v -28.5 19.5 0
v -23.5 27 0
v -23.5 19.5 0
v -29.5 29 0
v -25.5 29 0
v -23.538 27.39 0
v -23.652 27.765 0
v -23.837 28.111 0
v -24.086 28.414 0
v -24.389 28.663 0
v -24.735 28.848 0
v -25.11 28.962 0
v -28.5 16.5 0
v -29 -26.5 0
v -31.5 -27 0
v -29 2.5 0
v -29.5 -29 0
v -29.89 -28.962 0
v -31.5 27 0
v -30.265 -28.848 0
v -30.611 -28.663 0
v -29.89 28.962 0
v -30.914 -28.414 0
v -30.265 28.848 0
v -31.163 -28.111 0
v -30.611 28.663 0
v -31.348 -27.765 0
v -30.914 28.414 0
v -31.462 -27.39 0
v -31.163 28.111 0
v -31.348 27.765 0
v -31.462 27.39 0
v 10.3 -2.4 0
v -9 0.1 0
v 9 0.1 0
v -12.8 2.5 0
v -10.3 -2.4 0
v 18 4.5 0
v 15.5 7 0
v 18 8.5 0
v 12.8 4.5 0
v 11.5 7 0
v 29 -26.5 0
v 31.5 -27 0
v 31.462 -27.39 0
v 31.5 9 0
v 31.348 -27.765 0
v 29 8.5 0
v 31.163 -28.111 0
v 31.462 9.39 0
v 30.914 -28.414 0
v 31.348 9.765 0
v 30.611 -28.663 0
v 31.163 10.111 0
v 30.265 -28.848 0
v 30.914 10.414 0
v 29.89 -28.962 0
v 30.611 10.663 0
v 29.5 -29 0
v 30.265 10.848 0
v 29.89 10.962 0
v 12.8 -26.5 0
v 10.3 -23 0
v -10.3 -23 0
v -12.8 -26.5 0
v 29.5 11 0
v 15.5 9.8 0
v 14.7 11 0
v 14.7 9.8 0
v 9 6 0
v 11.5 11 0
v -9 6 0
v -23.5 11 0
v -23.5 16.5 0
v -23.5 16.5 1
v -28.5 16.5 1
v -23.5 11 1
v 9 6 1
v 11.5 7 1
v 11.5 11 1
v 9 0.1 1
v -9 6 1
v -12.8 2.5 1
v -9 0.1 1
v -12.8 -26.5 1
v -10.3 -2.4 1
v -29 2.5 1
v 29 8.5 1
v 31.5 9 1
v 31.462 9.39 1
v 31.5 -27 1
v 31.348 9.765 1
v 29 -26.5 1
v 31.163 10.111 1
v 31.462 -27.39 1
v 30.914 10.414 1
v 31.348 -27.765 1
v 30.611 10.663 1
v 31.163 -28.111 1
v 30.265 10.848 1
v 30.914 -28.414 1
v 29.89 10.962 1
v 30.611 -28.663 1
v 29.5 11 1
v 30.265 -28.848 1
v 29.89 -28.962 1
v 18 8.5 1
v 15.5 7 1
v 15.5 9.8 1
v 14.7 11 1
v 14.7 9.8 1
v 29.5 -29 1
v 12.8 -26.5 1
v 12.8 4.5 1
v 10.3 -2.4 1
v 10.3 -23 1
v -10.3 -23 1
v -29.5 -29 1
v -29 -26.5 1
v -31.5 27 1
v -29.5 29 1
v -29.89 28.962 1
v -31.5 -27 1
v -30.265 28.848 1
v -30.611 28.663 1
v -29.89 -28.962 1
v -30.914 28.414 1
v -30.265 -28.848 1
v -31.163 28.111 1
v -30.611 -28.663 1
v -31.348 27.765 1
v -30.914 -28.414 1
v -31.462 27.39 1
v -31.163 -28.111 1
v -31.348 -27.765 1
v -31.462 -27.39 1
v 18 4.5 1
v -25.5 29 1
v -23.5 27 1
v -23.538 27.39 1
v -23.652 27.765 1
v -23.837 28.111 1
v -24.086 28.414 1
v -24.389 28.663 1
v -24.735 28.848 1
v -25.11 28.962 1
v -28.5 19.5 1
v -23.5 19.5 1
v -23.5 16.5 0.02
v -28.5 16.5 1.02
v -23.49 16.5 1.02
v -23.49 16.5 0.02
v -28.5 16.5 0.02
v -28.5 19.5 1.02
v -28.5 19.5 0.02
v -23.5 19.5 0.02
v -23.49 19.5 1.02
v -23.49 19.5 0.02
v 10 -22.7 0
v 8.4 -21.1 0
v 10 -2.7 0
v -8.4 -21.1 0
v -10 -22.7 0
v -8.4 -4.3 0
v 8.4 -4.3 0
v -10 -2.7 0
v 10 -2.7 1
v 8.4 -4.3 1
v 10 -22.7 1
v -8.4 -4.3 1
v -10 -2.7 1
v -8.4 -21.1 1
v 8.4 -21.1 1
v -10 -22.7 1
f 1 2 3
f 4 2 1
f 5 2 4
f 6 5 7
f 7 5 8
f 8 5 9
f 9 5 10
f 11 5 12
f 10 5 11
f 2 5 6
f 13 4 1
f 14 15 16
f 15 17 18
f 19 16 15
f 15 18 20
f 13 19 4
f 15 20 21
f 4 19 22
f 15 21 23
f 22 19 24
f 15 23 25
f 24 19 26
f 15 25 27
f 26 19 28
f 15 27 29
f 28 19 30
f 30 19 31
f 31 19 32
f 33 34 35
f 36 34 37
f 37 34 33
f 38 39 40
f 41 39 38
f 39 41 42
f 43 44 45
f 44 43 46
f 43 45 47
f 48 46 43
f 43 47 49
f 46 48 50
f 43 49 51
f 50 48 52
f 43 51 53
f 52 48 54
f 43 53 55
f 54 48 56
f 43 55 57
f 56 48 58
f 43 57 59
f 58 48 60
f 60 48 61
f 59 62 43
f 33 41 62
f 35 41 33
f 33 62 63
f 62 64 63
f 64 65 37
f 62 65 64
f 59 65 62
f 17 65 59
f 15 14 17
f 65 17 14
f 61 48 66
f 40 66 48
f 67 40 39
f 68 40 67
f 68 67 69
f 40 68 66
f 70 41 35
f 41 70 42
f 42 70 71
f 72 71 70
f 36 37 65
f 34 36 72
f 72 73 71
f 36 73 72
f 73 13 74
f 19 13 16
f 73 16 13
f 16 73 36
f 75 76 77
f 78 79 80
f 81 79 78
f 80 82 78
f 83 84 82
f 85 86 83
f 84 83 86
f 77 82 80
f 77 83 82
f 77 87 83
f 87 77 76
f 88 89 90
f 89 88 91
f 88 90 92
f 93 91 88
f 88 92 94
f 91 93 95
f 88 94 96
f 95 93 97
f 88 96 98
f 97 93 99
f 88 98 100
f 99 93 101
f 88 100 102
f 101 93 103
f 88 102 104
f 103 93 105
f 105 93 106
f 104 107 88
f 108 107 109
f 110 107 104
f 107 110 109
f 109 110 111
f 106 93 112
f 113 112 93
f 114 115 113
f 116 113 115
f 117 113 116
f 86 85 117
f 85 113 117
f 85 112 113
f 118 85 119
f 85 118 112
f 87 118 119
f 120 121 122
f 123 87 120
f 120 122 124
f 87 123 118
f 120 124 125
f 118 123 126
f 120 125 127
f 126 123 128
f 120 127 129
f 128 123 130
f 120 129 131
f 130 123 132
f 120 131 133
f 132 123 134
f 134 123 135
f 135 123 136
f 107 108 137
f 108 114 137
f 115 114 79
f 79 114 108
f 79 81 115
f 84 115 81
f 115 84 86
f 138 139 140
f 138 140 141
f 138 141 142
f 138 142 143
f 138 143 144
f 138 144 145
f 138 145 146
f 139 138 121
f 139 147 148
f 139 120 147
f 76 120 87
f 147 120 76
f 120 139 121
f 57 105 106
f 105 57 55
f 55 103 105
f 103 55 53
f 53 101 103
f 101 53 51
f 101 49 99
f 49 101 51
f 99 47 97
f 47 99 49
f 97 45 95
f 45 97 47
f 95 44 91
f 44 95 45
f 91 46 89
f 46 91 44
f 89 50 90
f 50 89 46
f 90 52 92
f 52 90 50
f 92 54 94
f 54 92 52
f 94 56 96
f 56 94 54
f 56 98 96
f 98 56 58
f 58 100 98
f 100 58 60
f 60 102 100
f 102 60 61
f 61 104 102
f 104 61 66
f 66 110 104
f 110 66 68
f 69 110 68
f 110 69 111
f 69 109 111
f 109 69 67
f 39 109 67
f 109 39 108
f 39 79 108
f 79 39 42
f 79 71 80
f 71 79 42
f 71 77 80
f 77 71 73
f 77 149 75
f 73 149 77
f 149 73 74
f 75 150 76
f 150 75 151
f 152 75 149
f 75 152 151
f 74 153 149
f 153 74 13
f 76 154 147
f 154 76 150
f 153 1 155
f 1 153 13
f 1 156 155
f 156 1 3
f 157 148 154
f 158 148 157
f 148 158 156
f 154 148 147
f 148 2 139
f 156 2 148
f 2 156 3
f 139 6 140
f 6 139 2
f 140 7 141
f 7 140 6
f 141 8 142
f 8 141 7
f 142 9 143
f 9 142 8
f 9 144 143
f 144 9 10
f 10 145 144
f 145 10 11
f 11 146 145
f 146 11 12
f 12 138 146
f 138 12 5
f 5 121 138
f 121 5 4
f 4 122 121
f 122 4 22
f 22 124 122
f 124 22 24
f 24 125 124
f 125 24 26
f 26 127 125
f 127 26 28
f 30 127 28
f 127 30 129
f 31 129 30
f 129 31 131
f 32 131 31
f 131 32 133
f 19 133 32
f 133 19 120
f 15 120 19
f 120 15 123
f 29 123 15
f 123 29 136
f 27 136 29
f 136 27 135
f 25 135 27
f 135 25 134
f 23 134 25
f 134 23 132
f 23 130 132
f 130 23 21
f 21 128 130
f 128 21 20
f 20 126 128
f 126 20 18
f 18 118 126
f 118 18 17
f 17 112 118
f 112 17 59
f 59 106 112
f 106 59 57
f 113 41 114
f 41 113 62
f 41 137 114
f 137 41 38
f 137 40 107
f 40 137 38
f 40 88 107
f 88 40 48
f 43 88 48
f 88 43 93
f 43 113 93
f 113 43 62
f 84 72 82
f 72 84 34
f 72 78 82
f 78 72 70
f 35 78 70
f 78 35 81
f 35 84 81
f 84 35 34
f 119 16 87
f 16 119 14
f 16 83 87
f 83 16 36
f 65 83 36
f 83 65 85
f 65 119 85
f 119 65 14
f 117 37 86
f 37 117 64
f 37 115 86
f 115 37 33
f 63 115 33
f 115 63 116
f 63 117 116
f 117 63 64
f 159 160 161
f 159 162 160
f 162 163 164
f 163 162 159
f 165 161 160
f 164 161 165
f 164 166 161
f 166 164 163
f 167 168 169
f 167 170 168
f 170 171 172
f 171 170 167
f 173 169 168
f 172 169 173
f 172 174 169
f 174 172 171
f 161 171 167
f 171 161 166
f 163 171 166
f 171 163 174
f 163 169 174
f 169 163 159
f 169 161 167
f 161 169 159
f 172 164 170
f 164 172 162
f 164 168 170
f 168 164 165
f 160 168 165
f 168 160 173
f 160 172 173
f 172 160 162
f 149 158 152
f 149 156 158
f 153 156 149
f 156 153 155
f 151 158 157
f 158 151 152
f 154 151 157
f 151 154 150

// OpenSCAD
// file: ../lib/emboss.scad
// cad/lib/emboss.scad
include <../generated/dims.scad>

module engrave(code, at, z, size = LABEL_SIZE, facing = -1, spin = 0) {
    if (facing < 0)
        translate([at[0] + LABEL_DEPTH, at[1], z]) rotate([90, 0, -90])
            linear_extrude(LABEL_DEPTH + 0.01) rotate(spin) text(code, size = size, halign = "center", valign = "center");
    else
        translate([at[0] - LABEL_DEPTH, at[1], z]) rotate([90, 0, 90])
            linear_extrude(LABEL_DEPTH + 0.01) rotate(-spin) text(code, size = size, halign = "center", valign = "center");
}
// file: ../parts/setting_block.scad
// cad/parts/setting_block.scad
include <../generated/dims.scad>
use <../profile.scad>
use <../lib/emboss.scad>

function setting_top(pane_t) = GLASS_Y0 + (is_undef(pane_t) ? GLASS_T : pane_t);

module setting_block(code, wedge = false, pane_t) {
    s = tan(SILL_SLOPE_DEG);
    floor_x = function(y) FRAME_BODY - (bead_seat_y() - y) * s;
    y0 = GLASS_Y0;
    y1 = setting_top(pane_t);
    pts = wedge ? [[floor_x(y0), y0], [floor_x(y1), y1], [GLASS_EDGE, y1], [GLASS_EDGE, y0]]
                : [[0, y0], [0, y1], [GLASS_CLEAR, y1], [GLASS_CLEAR, y0]];
    difference() {
        linear_extrude(SETTING_L) polygon(pts);
        engrave(code, [wedge ? floor_x(y0) + 0.2 : 0, (y0 + y1) / 2], SETTING_L / 2, 3);
    }
}
// file: ../parts/weep_cap.scad
// cad/parts/weep_cap.scad
include <../generated/dims.scad>
use <../lib/emboss.scad>

module weep_cap(code) {
    w = WEEP_W + 10;
    t = WEEP_CAP_T;
    sx = (WEEP_CAP_H - WEEP_H) / 2;
    difference() {
        cube([WEEP_CAP_H, 4, w]);
        translate([-1, -0.01, t]) cube([WEEP_CAP_H - t + 1, 4 - t + 0.01, w - 2 * t]);
    }
    for (z = [5 + 0.2, w - 5 - 0.2 - 1.2])
        translate([sx + 0.2, -3, z]) cube([WEEP_H - 0.4, 3 + 4 - t + 0.01, 1.2]);
}
// file: ../parts/sill_nose.scad
// cad/parts/sill_nose.scad
include <../generated/dims.scad>
use <../profile.scad>
use <../lib/emboss.scad>

module nose_profile() {
    s = tan(SILL_SLOPE_DEG);
    p = NOSE_PROJECTION;
    top = NOSE_KEY_X + NOSE_KEY_W + 6;
    xt = function(y) top + y * s;
    difference() {
        union() {
            polygon([[top, 0], [NOSE_KEY_X - 2, 0], [NOSE_KEY_X - 2, -3], [xt(-3) - 3, -3],
                     [xt(-p + 3) - 3, -p + 3], [-4, -p + 3], [-4, -p], [xt(-p), -p]]);
            translate([NOSE_KEY_X, 0]) key_tongue(NOSE_KEY_D, NOSE_KEY_W);
        }
        rect(-2, -p + 2.4, 0, -p + 3 + 0.01);
    }
}

module sill_nose(len, code) {
    difference() {
        linear_extrude(len) nose_profile();
        engrave(code, [NOSE_KEY_X - 2, -1.5], len / 2, 2);
    }
}
// file: ../parts/screen_hinge.scad
// cad/parts/screen_hinge.scad
include <../generated/dims.scad>

KN_D = 10;
PIN_D = 4.3;
LEAF_T = 3;
AXIS_W = SCREEN_DEPTH + 5;
FRAME_KN = [[-20, -12], [-4, 4], [12, 20]];
SCREEN_KN = [[-11.6, -4.4], [4.4, 11.6]];
WALL_T = 3;
PLATE_W = 17;

function hinge_hole_v() = HINGE_BOSS_X - (FRAME_BODY - SCREEN_OVERLAP);
function hinge_wall_v() = -WALL_T;
function hinge_plate_v() = -WALL_T - PLATE_W;
function hinge_leaf_t() = LEAF_T;

WALL_R = 1;

module soften_plan(r) { offset(r = r, $fn = 32) offset(delta = -r) children(); }

module knuckles(spans) {
    for (s = spans) translate([s[0], 0, AXIS_W]) rotate([0, 90, 0]) cylinder(d = KN_D, h = s[1] - s[0], $fn = 32);
}

module pin_hole() {
    translate([-21, 0, AXIS_W]) rotate([0, 90, 0]) cylinder(d = PIN_D, h = 42, $fn = 20);
}

module screen_hinge(code) {
    v_hole = hinge_hole_v();
    assert(EDGE_R <= PLATE_W / 2 && WALL_R <= WALL_T / 2, "hinge leaf rounding fits the plate and wall");
    difference() {
        union() {
            linear_extrude(LEAF_T) union() {
                soften_plan(EDGE_R) translate([-20, hinge_plate_v()]) square([40, PLATE_W]);
                translate([-20, hinge_plate_v() + EDGE_R]) square([40, PLATE_W - EDGE_R]);
                translate([-20, hinge_wall_v()]) square([40, WALL_T - WALL_R]);
            }
            linear_extrude(AXIS_W) soften_plan(WALL_R) translate([-20, hinge_wall_v()]) square([40, WALL_T]);
            knuckles(FRAME_KN);
        }
        pin_hole();
        for (u = [-BOSS_PITCH / 2, BOSS_PITCH / 2])
            translate([u, v_hole, -0.01]) cylinder(d = 4.4, h = LEAF_T + 0.02, $fn = 20);
    }
}

module screen_leaf(code) {
    assert(EDGE_R <= 5 / 2, "screen leaf rounding fits its wall");
    difference() {
        union() {
            translate([0, 0, SCREEN_DEPTH]) linear_extrude(LEAF_T) soften_plan(EDGE_R) translate([-12, 0]) square([24, 28]);
            translate([0, 0, SCREEN_DEPTH]) linear_extrude(AXIS_W - SCREEN_DEPTH) soften_plan(EDGE_R) translate([-12, 0]) square([24, 5]);
            knuckles(SCREEN_KN);
        }
        pin_hole();
        for (u = [-8, 8]) translate([u, 18, SCREEN_DEPTH - 0.01]) cylinder(d = 3.4, h = LEAF_T + 0.02, $fn = 16);
    }
}
// file: ../parts/cam_lock.scad
// cad/parts/cam_lock.scad
include <../generated/dims.scad>

R0 = 18;
R1 = 40;
LEAD = 2;
RISE = 3;
ARC = 40;
BASE_T = 4;
BOSS_D = 14;
BOSS_H = 5;
LIP_T = 3;
HUB_D = 26;
LIP_HALF = 10;
KEEPER_HALF = 20;

function sash_face_w() = LIP_Y1 - DEPTH;
function keeper_v() = TRANSOM_W / 2 + TRANSOM_HALF_BODY + SASH_GAP + SASH_BODY / 2 - CAM_BOSS_X;
function lip_w() = BASE_T + LEAD + RISE;
function flag_half_run() = R1 * sin(ARC / 2);
function keeper_lip_half_run() = LIP_HALF;
function keeper_half_run() = KEEPER_HALF;

TOP_R = 1.5;

module soften_plan(r) { offset(r = r, $fn = 32) offset(delta = -r) children(); }

module soft_top(h, r = TOP_R, n = 6) {
    linear_extrude(h - r) children();
    for (i = [0 : n - 1]) translate([0, 0, h - r + i * r / n - 0.01]) linear_extrude(r / n + 0.01)
        offset(delta = -(r - sqrt(r * r - pow((i + 1) * r / n, 2)))) children();
}

module countersunk(d, t) {
    translate([0, 0, -0.01]) cylinder(d = d, h = t + 0.02, $fn = 20);
    translate([0, 0, t - 2.2]) cylinder(d1 = d, d2 = CSK_D, h = 2.21, $fn = 24);
}

module cam_base(code) {
    assert(EDGE_R <= 22 / 2, "cam base plate rounding fits the plate");
    difference() {
        union() {
            linear_extrude(BASE_T) soften_plan(EDGE_R) translate([-20, -10]) square([40, 22]);
            cylinder(d = BOSS_D, h = BASE_T + BOSS_H, $fn = 48);
        }
        for (u = [-BOSS_PITCH / 2, BOSS_PITCH / 2]) translate([u, 0, 0]) countersunk(4.4, BASE_T);
        translate([0, 0, BASE_T + BOSS_H - INSERT_M4_L + 0.01]) cylinder(d = INSERT_M4_D, h = INSERT_M4_L, $fn = 24);
    }
}

module flag_slice(k) {
    rotate([0, 0, 90 - ARC / 2 + k * ARC / 8])
        translate([R0, -0.5, BASE_T]) cube([R1 - R0, 1, LEAD + RISE * (1 - k / 8)]);
}

module flag_web(k) {
    rotate([0, 0, 90 - ARC / 2 + k * ARC / 8])
        translate([HUB_D / 2 - 1, -0.5, BASE_T]) cube([R0 - HUB_D / 2 + 2, 1, LEAD]);
}

module cam_handle(code) {
    assert(HANDLE_R <= 12 / 2 && TOP_R <= BOSS_H - 0.3, "cam handle rounding fits the lever and hub");
    difference() {
        union() {
            translate([0, 0, BASE_T]) soft_top(BOSS_H - 0.3) circle(d = HUB_D, $fn = 48);
            for (k = [0 : 7]) hull() { flag_slice(k); flag_slice(k + 1); }
            for (k = [0 : 7]) hull() { flag_web(k); flag_web(k + 1); }
            translate([0, 0, BASE_T]) soft_top(10) soften_plan(HANDLE_R) union() {
                translate([-64, -6]) square([58, 12]);
                translate([-64, 0]) circle(d = 16, $fn = 32);
            }
        }
        translate([0, 0, BASE_T - 0.01]) cylinder(d = BOSS_D + 0.4, h = BOSS_H + 0.02, $fn = 48);
    }
}

module cam_keeper(code) {
    kv = keeper_v();
    sw = sash_face_w();
    assert(EDGE_R <= 10 / 2, "keeper rounding fits the post");
    difference() {
        union() {
            translate([0, 0, sw]) linear_extrude(3) soften_plan(EDGE_R) translate([-KEEPER_HALF, kv - 6]) square([2 * KEEPER_HALF, 22]);
            translate([0, 0, sw]) linear_extrude(lip_w() + LIP_T - sw) soften_plan(EDGE_R) translate([-8, kv + 5]) square([16, 10]);
            translate([-LIP_HALF, R0 - 2, lip_w()]) cube([2 * LIP_HALF, kv + 15 - (R0 - 2), LIP_T]);
        }
        for (u = [-BOSS_PITCH / 2, BOSS_PITCH / 2]) translate([u, kv, sw]) countersunk(4.4, 3);
    }
}
// file: ../parts/transom_shoe.scad
// cad/parts/transom_shoe.scad
include <../generated/dims.scad>
use <../profile.scad>
use <../lib/segment.scad>
use <../lib/emboss.scad>
use <jamb_node.scad>

EPS = 0.01;

function shoe_fin_stub() = [TRANSOM_W / 2 + TRANSOM_HALF_BODY + FIN_L - EPS, FIN_Y0, TRANSOM_W, FIN_Y1, 0, FIN_L];

function shoe_turn(j, r, up, seam = false) =
    [[up ? r[0] : -EPS, r[1], up ? TRANSOM_W + EPS : r[2], r[3], seam ? -EPS : j[0] - FRAME_BODY, j[2] - FRAME_BODY], j, r, seam];

function shoe_turns() = [
    shoe_turn(seal_kerf_rects("sash_rebate")[0], seal_kerf_rects("transom")[0], true),
    shoe_turn(seal_kerf_rects("sash_rebate")[1], seal_kerf_rects("transom")[1], true),
    shoe_turn(mag_rect("sash_rebate"), mag_rect("transom"), true, true),
    shoe_turn(glazing_kerf_rect("glazing"), glazing_kerf_rect("transom"), false),
];

function shoe_seam_groove() =
    [glazing_kerf_rect("transom")[2] + MIN_SKIN, STOP_T / 2 - CORD_D / 2,
     TRANSOM_W / 2 + TRANSOM_HALF_BODY - MIN_SKIN, STOP_T / 2 + CORD_D / 2, -EPS, CORD_D / 2];

module box(b) { translate([b[0], b[1], b[4]]) cube([b[2] - b[0], b[3] - b[1], b[5] - b[4]]); }

module transom_shoe(code, mirrored = false, core) {
    L = FRAME_W - FRAME_BODY;
    c = TRANSOM_W / 2;
    at = label_at("transom");
    difference() {
        translate([mirrored ? TRANSOM_W : 0, 0, 0]) mirror([mirrored ? 1 : 0, 0, 0]) difference() {
            union() {
                linear_extrude(L) profile("transom", core = core);
                linear_extrude(SHOE_WALL) profile_solid("transom", false, core);
                fin_stub(shoe_fin_stub());
                multmatrix([[0, 1, 0, c], [0, 0, 1, STOP_T + DOVE_CLEAR], [1, 0, 0, 0]])
                    linear_extrude(DEPTH - STOP_T - DOVE_CLEAR) dove_tongue2d();
            }
            for (t = shoe_turns()) box(t[0]);
            translate([0, 0, L - CORD_D / 2]) end_groove("transom", core);
            bevel_ends(L, bottom = false) bevel_outline("transom", core);
            for (q = lock_uv()) translate([c + q[1], 0, q[0]]) lock_hole();
            box(shoe_seam_groove());
            tube_screw("transom", SHOE_WALL + (L - SHOE_WALL) / 2, DEPTH - MAG_D, core);
        }
        engrave(code, [mirrored ? TRANSOM_W - at[0] : at[0], at[1]], L / 2, facing = mirrored ? 1 : -1);
    }
}
// file: ../parts/jamb_node.scad
// cad/parts/jamb_node.scad
include <../generated/dims.scad>
use <../profile.scad>
use <../lib/segment.scad>
use <../lib/emboss.scad>

EPS = 0.01;

function lock_uv(d = DOVE_D, f = DOVE_FLARE, u = LOCK_U) = [for (s = [-1, 1]) [-u, s * (DOVE_W / 2 + f * u / d)]];

function lock_top() = DEPTH - MAG_D;

module lock_hole() {
    s = DEPTH - lock_top();
    translate([0, DEPTH + EPS, 0]) rotate([90, 0, 0]) {
        cylinder(d = LOCK_D, h = LOCK_L + EPS, $fn = 16);
        translate([0, 0, s]) cylinder(d1 = CSK_D, d2 = LOCK_D, h = (CSK_D - LOCK_D) / 2, $fn = 32);
        translate([0, 0, -1]) cylinder(d = CSK_D, h = s + 1 + EPS, $fn = 32);
    }
}

function node_key_len() = TRANSOM_W / 2 - TRANSOM_HALF_BODY;

function dove_slot(d = DOVE_D, f = DOVE_FLARE) =
    let(m = DOVE_W / 2, b = m + f)
    [[EPS, -m], [EPS, m], [0, m], [-d, b], [-d, -b], [0, -m]];

function dove_head(c, d = DOVE_D, f = DOVE_FLARE) =
    let(m = DOVE_W / 2, b = m + f, l = norm([d, f]), mh = m - c * (l - f) / d, bh = b - c * (l + f) / d)
    [[-c, -mh], [-c, mh], [-d + c, bh], [-d + c, -bh]];

function dove_root_w() = DOVE_W - 2 * DOVE_CLEAR;

function dove_root_d() = SHOE_WALL;

module dove_slot2d(d = DOVE_D, f = DOVE_FLARE) { polygon(dove_slot(d, f)); }

module dove_tongue2d(d = DOVE_D, f = DOVE_FLARE) {
    polygon(dove_head(DOVE_CLEAR, d, f));
    translate([-DOVE_CLEAR - EPS, -dove_root_w() / 2]) square([dove_root_d() + DOVE_CLEAR + EPS, dove_root_w()]);
}

module jamb_node(code, core) {
    c = TRANSOM_W / 2;
    k = node_key_len();
    b = [0, 0, FRAME_BODY, DEPTH];
    s = node_sharp(b, ["glazing", "sash_rebate"]);
    difference() {
        linear_extrude(TRANSOM_W) soft_rect(b, s);
        bevel_ends(TRANSOM_W) difference() { soft_rect(b, s); bead_key("glazing"); }
        translate([0, 0, -EPS]) linear_extrude(TRANSOM_W + 2 * EPS) pocket_cut("glazing", core);
        for (z = [-EPS, TRANSOM_W - k]) translate([0, 0, z]) linear_extrude(k + EPS) bead_key("glazing");
        for (z = [-EPS, TRANSOM_W - CORD_D / 2]) translate([0, 0, z]) intersection() { end_groove("glazing", core); linear_extrude(CORD_D) offset(delta = -CORD_INSET) soft_rect(b, s); }
        translate([FRAME_BODY, DEPTH + EPS, c]) rotate([90, 0, 0]) linear_extrude(DEPTH - STOP_T + EPS) dove_slot2d();
        for (q = lock_uv()) translate([FRAME_BODY + q[0], 0, c + q[1]]) lock_hole();
        tube_screw("glazing", c, core = core);
        for (dz = [-NODE_FIX_OFFSET, NODE_FIX_OFFSET]) fixing_hole("glazing", c + dz);
        engrave(code, label_at("glazing"), c);
    }
}
// file: ../parts/corner_block.scad
// cad/parts/corner_block.scad
include <../generated/dims.scad>
use <../profile.scad>
use <../lib/segment.scad>
use <../lib/emboss.scad>

EPS = 0.01;
ALONG_X = [[0, 0, 1, 0], [0, 1, 0, 0], [1, 0, 0, 0]];

function socket_limit(a, b, core) = profile_width(b) - pocket_rect(b, core)[2] - CHAMBER_WALL;
function corner_anchor(a, b) = profile_width(b) - socket_depth(a) / 2;
function corner_screw_at(a, b) = corner_anchor(a, b) - fix_dz(a) / 2;
function corner_fix_at(a, b) = corner_anchor(a, b) + fix_dz(a) / 2;

module half_space(lo, hi, below) {
    pts = below ? [[lo, lo], [hi, lo], [hi, hi]] : [[lo, lo], [hi, hi], [lo, hi]];
    translate([0, DEPTH + 1, 0]) rotate([90, 0, 0]) linear_extrude(DEPTH + 2) polygon(pts);
}

module leg(a, b, core) {
    z0 = profile_min(b);
    z1 = profile_width(b);
    translate([0, 0, z0]) linear_extrude(z1 - z0) profile(a, false, core);
    translate([0, 0, z1 - END_CAP]) end_cap(a, false, core);
    intersection() {
        translate([0, 0, z0]) linear_extrude(z1 - z0) profile_solid(a, false, core);
        union() {
            screw_column(a, corner_screw_at(a, b), core);
            if (is_perimeter(a)) fixing_column(a, corner_fix_at(a, b));
        }
    }
}

module leg_cuts(a, b, core) {
    z1 = profile_width(b);
    translate([0, 0, z1 - socket_depth(a)]) linear_extrude(socket_depth(a) + EPS) pocket_cut(a, core);
    translate([0, 0, z1 - CORD_D / 2]) end_groove(a, core);
    bevel_ends(z1, bottom = false) bevel_outline(a, core);
    tube_screw(a, corner_screw_at(a, b), core = core);
    if (is_perimeter(a)) fixing_hole(a, corner_fix_at(a, b));
}

module corner_block(a, b, code, mirrored = false, core_a, core_b) {
    assert(socket_depth(a) <= socket_limit(a, b, core_b) && socket_depth(b) <= socket_limit(b, a, core_a), str(code, ": tube sockets collide"));
    lo = min(profile_min(a), profile_min(b));
    hi = max(profile_width(a), profile_width(b));
    difference() {
        mirror([mirrored ? 1 : 0, 0, 0]) difference() {
            union() {
                intersection() {
                    multmatrix(ALONG_X) leg(a, b, core_a);
                    half_space(lo - 1, hi + 1, true);
                }
                intersection() {
                    leg(b, a, core_b);
                    half_space(lo - 1, hi + 1, false);
                }
            }
            multmatrix(ALONG_X) leg_cuts(a, b, core_a);
            leg_cuts(b, a, core_b);
        }
        engrave(code, label_at(b), (profile_min(a) + profile_width(a)) / 2, facing = mirrored ? 1 : -1);
    }
}
// file: ../lib/segment.scad
// cad/lib/segment.scad
include <../generated/dims.scad>
use <../profile.scad>
use <emboss.scad>

EPS = 0.01;

function is_perimeter(name) = name == "glazing" || name == "sash_rebate" || name == "sill";

function top_face(name) = name == "sash" ? LIP_Y1 : name == "screen" ? SCREEN_DEPTH : DEPTH;

function boss_x(name) =
    name == "sash_rebate" ? HINGE_BOSS_X : name == "transom" ? CAM_BOSS_X : name == "sash" ? SASH_BODY / 2 : undef;

function boss_offsets(dz) = dz == 0 ? [0] : [-dz, dz];

function boss_dz_min(name, core) =
    BOSS_PITCH / 2 + max((INSERT_M4_D + MIN_SKIN) / 2,
        fix_dz(name) / 2 + sqrt(max(0, pow(csk_d(name, core) / 2 + INSERT_M4_D / 2 + MIN_SKIN, 2) - pow(boss_x(name) - screw_x(name, core), 2))));

function boss_dz_max(len) = len / 2 - END_CAP - MIN_SKIN - INSERT_M4_D / 2 - BOSS_PITCH / 2;

function screw_x(name, core) =
    name == "transom" ? (core == "vslot" ? VSLOT_TRANSOM_X : TRANSOM_SCREW_X) : pocket_origin(name, core)[0] + pocket(name)[0] / 2;

function tnut(name, core) = core == "vslot" && name != "transom";

function csk_d(name, core) = tnut(name, core) ? VSLOT_CSK_D : CSK_D;

function column_d(name, core) = tnut(name, core) ? VSLOT_CSK_D + 4 : 10;

function vslot_shell(name) = top_face(name) - pocket_rect(name, "vslot")[3];

function vslot_tip_target() = (VSLOT_TIP[0] + VSLOT_TIP[1]) / 2;

function vslot_screw_l(name) = max([for (l = VSLOT_M5_L) if (l <= vslot_shell(name) + vslot_tip_target() + 1e-9) l]);

function vslot_seat(name) = vslot_shell(name) + vslot_tip_target() - vslot_screw_l(name);

function label_at(name) =
    name == "transom" ? [TRANSOM_W / 2 - TRANSOM_HALF_BODY, GLASS_Y0 + 11]
  : name == "mullion_glazing" ? [MULLION_W / 2 - MULLION_HALF_BODY, GLASS_Y0 + 11]
  : name == "mullion_sash" ? [MULLION_W / 2 - MULLION_HALF_BODY, (FIN_Y1 + LIP_Y0) / 2]
  : name == "sash" ? [0, (FLANGE_Y1 + LIP_Y0) / 2]
  : name == "screen" ? [0, SCREEN_DEPTH / 2]
  : [0, DEPTH / 2];

function weep_rect(name) =
    name == "sill" ? let(f = FRAME_BODY - (bead_seat_y() - STOP_T) * tan(SILL_SLOPE_DEG)) [f - 1, -1, f - 1 + WEEP_H, STOP_T + 1]
  : name == "transom" ? let(th = TRANSOM_W / 2 + TRANSOM_HALF_BODY) [th - 0.5, FIN_Y0 - 1, th + WEEP_H, FIN_Y1 + 1]
  : name == "sash" ? [SASH_BODY - 1, SASH_Y0 - 1, SASH_BODY - 1 + WEEP_H, STOP_T + 1]
  : undef;

module end_groove(name, core) { linear_extrude(CORD_D / 2 + EPS) cord_ring(name, core); }

module end_cap(name, pocket = true, core) { linear_extrude(END_CAP) profile_solid(name, pocket, core); }

module tube_screw(name, z, top = undef, core) {
    t = tnut(name, core);
    assert(!t || is_undef(top), str(name, ": a T-nut screw takes no seat override"));
    p = pocket_rect(name, core);
    d = t ? VSLOT_SCREW_D : TUBE_SCREW_D;
    k = csk_d(name, core);
    cone = t ? (k - d) / 2 : 2.2;
    h = (t ? top_face(name) - vslot_seat(name) : is_undef(top) ? top_face(name) : top) - p[3];
    translate([screw_x(name, core), p[3] - EPS, z]) rotate([-90, 0, 0]) {
        cylinder(d = d, h = top_face(name) - p[3] + 1, $fn = 24);
        translate([0, 0, h - cone]) cylinder(d1 = d, d2 = k, h = cone + 2 * EPS, $fn = 32);
        translate([0, 0, h]) cylinder(d = k, h = top_face(name) - p[3] - h + 1, $fn = 32);
    }
}

module screw_column(name, z, core) {
    p = pocket_rect(name, core);
    translate([screw_x(name, core), p[3], z]) rotate([-90, 0, 0]) cylinder(d = column_d(name, core), h = top_face(name) - p[3], $fn = 32);
}

module fixing_hole(name, z) {
    translate([-1, fix_y(name), z]) rotate([0, 90, 0]) cylinder(d = FIX_D, h = FRAME_W + 2, $fn = 24);
    translate([rebate_face(name) - FIX_CB_L, fix_y(name), z]) rotate([0, 90, 0])
        cylinder(d = FIX_CB_D, h = FIX_CB_L + 1, $fn = 32);
}

module fixing_column(name, z) {
    translate([-1, fix_y(name), z]) rotate([0, 90, 0]) cylinder(d = FIX_BOSS_D, h = FRAME_BODY + 1, $fn = 40);
}

module boss_columns(name, z, core) {
    p = pocket_rect(name, core);
    for (dz = [-BOSS_PITCH / 2, BOSS_PITCH / 2])
        translate([boss_x(name), p[3], z + dz]) rotate([-90, 0, 0])
            cylinder(d = INSERT_M4_D + 4, h = top_face(name) - p[3], $fn = 32);
}

module insert_holes(name, z) {
    for (dz = [-BOSS_PITCH / 2, BOSS_PITCH / 2])
        translate([boss_x(name), top_face(name) + EPS, z + dz]) rotate([90, 0, 0])
            cylinder(d = INSERT_M4_D, h = INSERT_M4_L, $fn = 24);
}

module local_solids(name, z, bosses = false, boss_dz = 0, core) {
    screw_column(name, z - fix_dz(name) / 2, core);
    if (is_perimeter(name)) fixing_column(name, z + fix_dz(name) / 2);
    if (bosses) for (c = boss_offsets(boss_dz)) boss_columns(name, z + c, core);
}

module local_cuts(name, z, bosses = false, boss_dz = 0, core) {
    tube_screw(name, z - fix_dz(name) / 2, core = core);
    if (is_perimeter(name)) fixing_hole(name, z + fix_dz(name) / 2);
    if (bosses) for (c = boss_offsets(boss_dz)) insert_holes(name, z + c);
}

module segment(name, len, code, weep = false, bosses = false, boss_dz = 0, core) {
    assert(len > 0 && len <= MAX_SEG, str(code, ": length ", len, " outside 0..", MAX_SEG));
    assert(!weep || name == "sill" || name == "transom" || name == "sash", str(code, ": no weep on ", name));
    assert(!bosses || boss_x(name) != undef, str(code, ": no bosses on ", name));
    if (boss_dz != 0)
        assert(bosses && abs(boss_dz) >= boss_dz_min(name, core) && abs(boss_dz) <= boss_dz_max(len),
               str(code, ": boss offset ", boss_dz, " outside ", boss_dz_min(name, core), "..", boss_dz_max(len)));
    difference() {
        union() {
            linear_extrude(len) profile(name, core = core);
            for (z = [0, len - END_CAP]) translate([0, 0, z]) end_cap(name, core = core);
            intersection() {
                linear_extrude(len) profile_solid(name, core = core);
                local_solids(name, len / 2, bosses, abs(boss_dz), core);
            }
        }
        for (z = [-EPS, len - CORD_D / 2]) translate([0, 0, z]) end_groove(name, core);
        bevel_ends(len) bevel_outline(name, core);
        local_cuts(name, len / 2, bosses, abs(boss_dz), core);
        if (weep) translate([0, 0, len / 2 - WEEP_W / 2]) linear_extrude(WEEP_W) rect_r(weep_rect(name));
        engrave(code, label_at(name), len / 2);
    }
}
// file: ../generated/layout.scad
NAME = "bench-600";
W = 584.0;
H = 584.0;
TRANSOM_C = 291.0;
AWNING_H = 200.0;
SASH = [478.0, 210.0];
SCREEN = [524.0, 290.0];
FIXED_GLASS = [498, 228];
SASH_GLASS_DIMS = [406, 138];
GLAZING = "acrylic";
SEG_HEAD = 232.5;
N_HEAD = 2;
SEG_SILL = 232.5;
N_SILL = 2;
SEG_JAMB_LOWER = 196.0;
N_JAMB_LOWER = 1;
SEG_JAMB_UPPER = 198.0;
N_JAMB_UPPER = 1;
SEG_TRANSOM = 232.5;
N_TRANSOM = 2;
SEG_SASH_HORIZONTAL = 186.5;
N_SASH_HORIZONTAL = 2;
SEG_SASH_VERTICAL = 106.0;
N_SASH_VERTICAL = 1;
SEG_SCREEN_HORIZONTAL = 232.0;
N_SCREEN_HORIZONTAL = 2;
SEG_SCREEN_VERTICAL = 230.0;
N_SCREEN_VERTICAL = 1;
// file: ../generated/dims.scad
MAX_SEG = 240.0;
JOINT_GAP = 1.0;
DEPTH = 63.0;
FRAME_W = 58.0;
FRAME_BODY = 40.0;
TRANSOM_W = 70.0;
TRANSOM_HALF_BODY = 17.0;
SASH_W = 51.0;
SASH_BODY = 33.0;
SASH_Y0 = 2.0;
SASH_GAP = 13.0;
STAY_W = 14.0;
SCREEN_W = 30.0;
SCREEN_DEPTH = 20.0;
SCREEN_OVERLAP = 10.0;
SCREEN_SHELL = 4.0;
GLASS_T = 24.0;
TWINWALL_T = 16.0;
GLASS_CLEAR = 3.0;
GASKET_T = 3.0;
GASKET_IN = 4.0;
GLASS_EDGE = 43.0;
TRANSOM_GLASS = 20.0;
SASH_GLASS = 36.0;
STOP_T = 8.0;
GLASS_Y0 = 11.0;
BEAD_W = 16.0;
BEAD_T = 10.0;
KEY_Y = 43.0;
KEY_D = 4.0;
KEY_H = 4.0;
KEY_LIP = 0.8;
KEY_THROAT = 1.2;
FIN_Y0 = 20.0;
FIN_Y1 = 28.0;
FIN_L = 8.0;
ISTOP_Y0 = 54.0;
FLANGE_Y1 = 17.0;
FLANGE_L = 11.0;
LIP_Y0 = 46.0;
LIP_Y1 = 52.0;
LIP_L = 8.0;
KERF_W = 3.0;
KERF_D = 5.0;
MAG_W = 13.0;
MAG_D = 2.0;
SPLINE_W = 4.0;
SPLINE_D = 5.0;
SPACER_W = 12.0;
ACRYLIC_T = 4.0;
SETTING_L = 100.0;
WEEP_CAP_H = 12.0;
WEEP_CAP_T = 1.5;
TUBE_FRAME = [20.0, 20.0];
TUBE_TRANSOM = [20.0, 40.0];
TUBE_SASH = [20.0, 20.0];
TUBE_SCREEN = [10.0, 10.0];
SOCKET_FRAME = 28.0;
SOCKET_SASH = 21.0;
SOCKET_SCREEN = 12.0;
TUBE_END_CLEAR = 1.5;
TUBE_CLEAR = 0.3;
MIN_SHELL = 6.0;
CHAMBER_WALL = 2.5;
MIN_SKIN = 1.5;
END_CAP = 4.0;
CORD_D = 3.0;
CORD_INSET = 1.5;
FIX_Y = 16.0;
FIX_Y_IN = 48.0;
FIX_DZ = 7.0;
FIX_D = 5.0;
FIX_CB_D = 10.0;
FIX_CB_L = 6.0;
FIX_BOSS_D = 15.0;
TUBE_SCREW_D = 4.2;
CSK_D = 8.6;
TRANSOM_SCREW_X = 39.0;
INSERT_M4_D = 5.6;
INSERT_M4_L = 8.0;
BOSS_PITCH = 24.0;
CAM_ALIGN_TOL = 1.0;
DOVE_W = 16.0;
DOVE_FLARE = 3.0;
DOVE_D = 6.0;
DOVE_CLEAR = 0.3;
LOCK_U = 3.0;
LOCK_D = 3.3;
LOCK_L = 22.0;
NODE_FIX_OFFSET = 25.0;
SHOE_WALL = 3.0;
HINGE_BOSS_X = 21.0;
CAM_BOSS_X = 47.0;
TRANSOM_MAG_X = 20.0;
LABEL_DEPTH = 0.6;
LABEL_SIZE = 5.0;
BEAD_LABEL = 3.0;
WEEP_W = 20.0;
WEEP_H = 5.0;
SILL_SLOPE_DEG = 8.0;
NOSE_KEY_X = 10.0;
NOSE_KEY_W = 6.0;
NOSE_KEY_D = 4.0;
NOSE_PROJECTION = 15.0;
MULLION_W = 70.0;
MULLION_HALF_BODY = 17.0;
MULLION_DOVE_D = 4.0;
VSLOT_SHIFT = 3.0;
VSLOT_MOUTH = 9.16;
VSLOT_NECK = 6.25;
VSLOT_LIP = 1.8;
VSLOT_FLOOR = 6.1;
VSLOT_SHOULDER = [5.6, 8.5];
VSLOT_TIP = [5.0, 5.8];
VSLOT_SCREW_D = 5.5;
VSLOT_CSK_D = 10.0;
VSLOT_M5_L = [10, 12, 16, 20, 25, 30, 35, 40];
VSLOT_TRANSOM_X = 41.25;
EDGE_R = 2.0;
JOINT_BEVEL = 0.8;
BEVEL_STEP = 0.2;
HANDLE_R = 3.0;
// file: lib.scad
// cad/deck/lib.scad: palette and window-unit modules shared by the guide-deck views
include <../generated/dims.scad>
include <../generated/layout.scad>
use <../profile.scad>
use <../lib/segment.scad>
use <../parts/corner_block.scad>
use <../parts/jamb_node.scad>
use <../parts/transom_shoe.scad>
use <../parts/cam_lock.scad>
use <../parts/screen_hinge.scad>
use <../parts/sill_nose.scad>
use <../parts/weep_cap.scad>
use <../parts/setting_block.scad>

C_FRAME = "#c3cbd1";
C_TRANSOM = "#7fa7bf";
C_SASH = "#93b49c";
C_SCREEN = "#5f6a73";
C_BEAD = "#e2d6bd";
C_GLASS = "#b9dbe9";
C_GLASS_SOLID = "#b9dbe9";
C_ALU = "#878e94";
C_STEEL = "#4f565c";
C_SEAL = "#262626";
C_HI = "#ef8a22";
C_DONE = "#d9dee2";
C_MAG = "#8a5a35";
C_BLOCK = "#8e979e";

F = FRAME_W;
TB = TRANSOM_C - TRANSOM_W / 2;
SX0 = FRAME_BODY + SASH_GAP;
SZ0 = TRANSOM_C + TRANSOM_HALF_BODY + SASH_GAP;
NX0 = FRAME_BODY - SCREEN_OVERLAP;
NZ0 = TB + TRANSOM_MAG_X - SCREEN_OVERLAP - 2;
GAP = JOINT_GAP;
SOCK = SOCKET_FRAME - TUBE_END_CLEAR;
SASH_SOCK = SOCKET_SASH - TUBE_END_CLEAR;
SCREEN_SOCK = SOCKET_SCREEN - TUBE_END_CLEAR;
CAM_AT = F + GAP + SEG_TRANSOM / 2;

M_SILL = [[0, 0, 1, F], [0, 1, 0, 0], [1, 0, 0, 0]];
M_HEAD = [[0, 0, 1, F], [0, 1, 0, 0], [-1, 0, 0, H]];
M_TRANSOM = [[0, 0, 1, F], [0, 1, 0, 0], [1, 0, 0, TB]];

function m_jamb(right, z0) = right ? [[-1, 0, 0, W], [0, 1, 0, 0], [0, 0, 1, z0]] : [[1, 0, 0, 0], [0, 1, 0, 0], [0, 0, 1, z0]];
function m_sash_h(top) = [[0, 0, 1, SX0 + SASH_W], [0, 1, 0, 0], top ? [-1, 0, 0, SZ0 + SASH[1]] : [1, 0, 0, SZ0]];
function m_sash_v(right) = right ? [[-1, 0, 0, SX0 + SASH[0]], [0, 1, 0, 0], [0, 0, 1, SZ0 + SASH_W]] : [[1, 0, 0, SX0], [0, 1, 0, 0], [0, 0, 1, SZ0 + SASH_W]];
function m_screen_h(top) = [[0, 0, 1, NX0 + SCREEN_W], [0, 1, 0, DEPTH], top ? [-1, 0, 0, NZ0 + SCREEN[1]] : [1, 0, 0, NZ0]];
function m_screen_v(right) = right ? [[-1, 0, 0, NX0 + SCREEN[0]], [0, 1, 0, DEPTH], [0, 0, 1, NZ0 + SCREEN_W]] : [[1, 0, 0, NX0], [0, 1, 0, DEPTH], [0, 0, 1, NZ0 + SCREEN_W]];
function m_cam(x) = [[-1, 0, 0, x], [0, 0, 1, DEPTH], [0, 1, 0, TB + CAM_BOSS_X]];

function tube_wall(name) = name == "screen" ? 1.0 : 1.6;

module tube2d(name) {
    r = pocket_rect(name);
    c = TUBE_CLEAR;
    difference() {
        rect(r[0] + c, r[1] + c, r[2] - c, r[3] - c);
        offset(delta = -tube_wall(name)) rect(r[0] + c, r[1] + c, r[2] - c, r[3] - c);
    }
}

module seg_run(name, n, seg, m, col, vis = 2) {
    gap = name == "screen" ? 0 : GAP;
    multmatrix(m) color(col) for (i = [0 : n - 1])
        translate([0, 0, gap + i * (seg + gap) + vis / 2]) linear_extrude(seg - vis) profile(name);
}

module tube_run(name, len, ext, m, col) {
    multmatrix(m) color(col) translate([0, 0, -ext]) linear_extrude(len + 2 * ext) tube2d(name);
}

module sill_member(col, tubes = false, vis = 2) {
    seg_run("sill", N_SILL, SEG_SILL, M_SILL, col, vis);
    if (tubes) tube_run("sill", W - 2 * F, SOCK, M_SILL, C_ALU);
    color(col) {
        corner_block("sill", "glazing", "CSL");
        translate([W, 0, 0]) corner_block("sill", "glazing", "CSR", mirrored = true);
    }
}

module jamb_members(col, tubes = false, vis = 2) {
    for (r = [false, true]) {
        seg_run("glazing", N_JAMB_LOWER, SEG_JAMB_LOWER, m_jamb(r, F), col, vis);
        seg_run("sash_rebate", N_JAMB_UPPER, SEG_JAMB_UPPER, m_jamb(r, TB + TRANSOM_W), col, vis);
        color(col) translate([r ? W : 0, 0, TB]) mirror([r ? 1 : 0, 0, 0]) jamb_node("JN");
        if (tubes) tube_run("glazing", H - 2 * F, SOCK, m_jamb(r, F), C_ALU);
    }
}

module head_member(col, tubes = false, vis = 2) {
    seg_run("sash_rebate", N_HEAD, SEG_HEAD, M_HEAD, col, vis);
    if (tubes) tube_run("sash_rebate", W - 2 * F, SOCK, M_HEAD, C_ALU);
    color(col) {
        translate([0, 0, H]) mirror([0, 0, 1]) corner_block("sash_rebate", "sash_rebate", "CH");
        translate([W, 0, H]) mirror([1, 0, 0]) mirror([0, 0, 1]) corner_block("sash_rebate", "sash_rebate", "CH");
    }
}

module frame_unit(col = C_FRAME, tubes = false, vis = 2) {
    sill_member(col, tubes, vis);
    jamb_members(col, tubes, vis);
    head_member(col, tubes, vis);
}

module cam_set(x, keeper = true) {
    multmatrix(m_cam(x)) {
        color("#d9692b") cam_base("CMB");
        color(C_HI) cam_handle("CMH");
        if (keeper) color("#b8432f") cam_keeper("KP");
    }
}

module transom_unit(col = C_TRANSOM, tubes = false, cams = true, vis = 2) {
    seg_run("transom", N_TRANSOM, SEG_TRANSOM, M_TRANSOM, col, vis);
    if (tubes) tube_run("transom", W - 2 * F, F - FRAME_BODY - SHOE_WALL - 1, M_TRANSOM, C_STEEL);
    color(col) for (s = [[1, 0], [-1, W]])
        translate([s[1], 0, TB]) mirror([s[0] < 0 ? 1 : 0, 0, 0])
            multmatrix([[0, 0, 1, FRAME_BODY], [0, 1, 0, 0], [-1, 0, 0, TRANSOM_W]]) transom_shoe("TSL", mirrored = true);
    if (cams) for (x = [CAM_AT, W - CAM_AT]) cam_set(x, false);
}

module sash_glass() {
    translate([SX0 + SASH_GLASS, GLASS_Y0, SZ0 + SASH_GLASS]) cube([SASH_GLASS_DIMS[0], GLASS_T, SASH_GLASS_DIMS[1]]);
}

module fixed_glass() {
    translate([GLASS_EDGE, GLASS_Y0, GLASS_EDGE]) cube([FIXED_GLASS[0], GLASS_T, FIXED_GLASS[1]]);
}

module sash_unit(col = C_SASH, tubes = false, glass = true, keepers = false, vis = 2) {
    S = SASH_W;
    for (t = [false, true]) seg_run("sash", N_SASH_HORIZONTAL, SEG_SASH_HORIZONTAL, m_sash_h(t), col, vis);
    for (r = [false, true]) seg_run("sash", N_SASH_VERTICAL, SEG_SASH_VERTICAL, m_sash_v(r), col, vis);
    if (tubes) {
        for (t = [false, true]) tube_run("sash", SASH[0] - 2 * S, SASH_SOCK, m_sash_h(t), C_ALU);
        for (r = [false, true]) tube_run("sash", SASH[1] - 2 * S, SASH_SOCK, m_sash_v(r), C_ALU);
    }
    color(col) {
        translate([SX0, 0, SZ0]) corner_block("sash", "sash", "CS");
        translate([SX0 + SASH[0], 0, SZ0]) mirror([1, 0, 0]) corner_block("sash", "sash", "CS");
        translate([SX0, 0, SZ0 + SASH[1]]) mirror([0, 0, 1]) corner_block("sash", "sash", "CS");
        translate([SX0 + SASH[0], 0, SZ0 + SASH[1]]) mirror([1, 0, 0]) mirror([0, 0, 1]) corner_block("sash", "sash", "CS");
    }
    if (glass) color(C_GLASS) sash_glass();
    if (keepers) for (x = [CAM_AT, W - CAM_AT]) multmatrix(m_cam(x)) color("#b8432f") cam_keeper("KP");
}

module screen_unit(col = C_SCREEN, tubes = false, mesh = true, vis = 2) {
    N = SCREEN_W;
    for (t = [false, true]) seg_run("screen", N_SCREEN_HORIZONTAL, SEG_SCREEN_HORIZONTAL, m_screen_h(t), col, vis);
    for (r = [false, true]) seg_run("screen", N_SCREEN_VERTICAL, SEG_SCREEN_VERTICAL, m_screen_v(r), col, vis);
    if (tubes) for (t = [false, true]) tube_run("screen", SCREEN[0] - 2 * N, SCREEN_SOCK, m_screen_h(t), C_ALU);
    color(col) translate([0, DEPTH, 0]) {
        translate([NX0, 0, NZ0]) corner_block("screen", "screen", "CN");
        translate([NX0 + SCREEN[0], 0, NZ0]) mirror([1, 0, 0]) corner_block("screen", "screen", "CN");
        translate([NX0, 0, NZ0 + SCREEN[1]]) mirror([0, 0, 1]) corner_block("screen", "screen", "CN");
        translate([NX0 + SCREEN[0], 0, NZ0 + SCREEN[1]]) mirror([1, 0, 0]) mirror([0, 0, 1]) corner_block("screen", "screen", "CN");
    }
    if (mesh) color("#8d959b")
        translate([NX0 + N - 6, DEPTH + SCREEN_DEPTH - 1, NZ0 + N - 6]) cube([SCREEN[0] - 2 * N + 12, 0.6, SCREEN[1] - 2 * N + 12]);
}
// main file
// cad/deck/profiles.scad: one cross-section per render (k = 0..7), outside to the left, centred for a fixed ortho camera
include <lib.scad>

k = 0;
NAMES = ["glazing", "sash_rebate", "sill", "transom", "sash", "screen", "igu", "twinwall"];
COLS = [C_FRAME, C_FRAME, C_FRAME, C_TRANSOM, C_SASH, C_SCREEN, C_BEAD, C_BEAD];
name = NAMES[k];

function x_range(n) = n == "igu" || n == "twinwall" ? [-KEY_D, BEAD_W] : n == "sill" ? [-NOSE_PROJECTION, FRAME_W] : [profile_min(n), profile_width(n)];
function y_range(n) = n == "igu" || n == "twinwall" ? [bead_y0(n), bead_seat_y() + BEAD_T] : n == "sash" ? [SASH_Y0, LIP_Y1] : n == "screen" ? [0, SCREEN_DEPTH] : [0, DEPTH];

module up() multmatrix([[0, 1, 0, 0], [1, 0, 0, 0], [0, 0, 1, 0]]) children();
module lay(col, z = 0) color(col) translate([0, 0, z]) linear_extrude(1) children();

module dressing(n) {
    if (n == "sash_rebate" || n == "transom") {
        kr = seal_kerf_rects(n);
        lay(C_SEAL, 0.02) up() {
            rect_r(kr[0]);
            translate([(kr[0][0] + kr[0][2]) / 2, FIN_Y0 - 1.5]) circle(r = 1.6, $fn = 24);
            rect_r(kr[1]);
            translate([(kr[1][0] + kr[1][2]) / 2, ISTOP_Y0 - 1.0]) circle(r = 1.2, $fn = 24);
        }
        lay(C_MAG, 0.02) up() rect_r(mag_rect(n));
    }
    gk = glazing_kerf_rect(n);
    if (!is_undef(gk)) lay(C_SEAL, 0.02) up() rect_r(gk);
    if (n == "screen") {
        lay(C_MAG, 0.02) up() rect(SCREEN_OVERLAP + 2, 0, SCREEN_OVERLAP + 2 + MAG_W, MAG_D);
        lay(C_SEAL, 0.02) up() rect(SCREEN_W - 8, SCREEN_DEPTH - SPLINE_D, SCREEN_W - 8 + SPLINE_W, SCREEN_DEPTH);
    }
}

xr = x_range(name);
yr = y_range(name);
translate([-(yr[0] + yr[1]) / 2, -(xr[0] + xr[1]) / 2, 0]) {
    if (k >= 6) {
        lay(C_BEAD) up() bead_profile(name);
        lay(C_SEAL, 0.02) up() rect(GLASS_CLEAR + GASKET_IN - 1.5, bead_y0(name), GLASS_CLEAR + GASKET_IN + 1.5, bead_y0(name) + KERF_D);
    } else {
        lay(COLS[k]) up() profile(name);
        lay(name == "transom" ? C_STEEL : C_ALU) up() tube2d(name);
        dressing(name);
        if (name == "sill") lay(C_FRAME) up() nose_profile();
    }
}
